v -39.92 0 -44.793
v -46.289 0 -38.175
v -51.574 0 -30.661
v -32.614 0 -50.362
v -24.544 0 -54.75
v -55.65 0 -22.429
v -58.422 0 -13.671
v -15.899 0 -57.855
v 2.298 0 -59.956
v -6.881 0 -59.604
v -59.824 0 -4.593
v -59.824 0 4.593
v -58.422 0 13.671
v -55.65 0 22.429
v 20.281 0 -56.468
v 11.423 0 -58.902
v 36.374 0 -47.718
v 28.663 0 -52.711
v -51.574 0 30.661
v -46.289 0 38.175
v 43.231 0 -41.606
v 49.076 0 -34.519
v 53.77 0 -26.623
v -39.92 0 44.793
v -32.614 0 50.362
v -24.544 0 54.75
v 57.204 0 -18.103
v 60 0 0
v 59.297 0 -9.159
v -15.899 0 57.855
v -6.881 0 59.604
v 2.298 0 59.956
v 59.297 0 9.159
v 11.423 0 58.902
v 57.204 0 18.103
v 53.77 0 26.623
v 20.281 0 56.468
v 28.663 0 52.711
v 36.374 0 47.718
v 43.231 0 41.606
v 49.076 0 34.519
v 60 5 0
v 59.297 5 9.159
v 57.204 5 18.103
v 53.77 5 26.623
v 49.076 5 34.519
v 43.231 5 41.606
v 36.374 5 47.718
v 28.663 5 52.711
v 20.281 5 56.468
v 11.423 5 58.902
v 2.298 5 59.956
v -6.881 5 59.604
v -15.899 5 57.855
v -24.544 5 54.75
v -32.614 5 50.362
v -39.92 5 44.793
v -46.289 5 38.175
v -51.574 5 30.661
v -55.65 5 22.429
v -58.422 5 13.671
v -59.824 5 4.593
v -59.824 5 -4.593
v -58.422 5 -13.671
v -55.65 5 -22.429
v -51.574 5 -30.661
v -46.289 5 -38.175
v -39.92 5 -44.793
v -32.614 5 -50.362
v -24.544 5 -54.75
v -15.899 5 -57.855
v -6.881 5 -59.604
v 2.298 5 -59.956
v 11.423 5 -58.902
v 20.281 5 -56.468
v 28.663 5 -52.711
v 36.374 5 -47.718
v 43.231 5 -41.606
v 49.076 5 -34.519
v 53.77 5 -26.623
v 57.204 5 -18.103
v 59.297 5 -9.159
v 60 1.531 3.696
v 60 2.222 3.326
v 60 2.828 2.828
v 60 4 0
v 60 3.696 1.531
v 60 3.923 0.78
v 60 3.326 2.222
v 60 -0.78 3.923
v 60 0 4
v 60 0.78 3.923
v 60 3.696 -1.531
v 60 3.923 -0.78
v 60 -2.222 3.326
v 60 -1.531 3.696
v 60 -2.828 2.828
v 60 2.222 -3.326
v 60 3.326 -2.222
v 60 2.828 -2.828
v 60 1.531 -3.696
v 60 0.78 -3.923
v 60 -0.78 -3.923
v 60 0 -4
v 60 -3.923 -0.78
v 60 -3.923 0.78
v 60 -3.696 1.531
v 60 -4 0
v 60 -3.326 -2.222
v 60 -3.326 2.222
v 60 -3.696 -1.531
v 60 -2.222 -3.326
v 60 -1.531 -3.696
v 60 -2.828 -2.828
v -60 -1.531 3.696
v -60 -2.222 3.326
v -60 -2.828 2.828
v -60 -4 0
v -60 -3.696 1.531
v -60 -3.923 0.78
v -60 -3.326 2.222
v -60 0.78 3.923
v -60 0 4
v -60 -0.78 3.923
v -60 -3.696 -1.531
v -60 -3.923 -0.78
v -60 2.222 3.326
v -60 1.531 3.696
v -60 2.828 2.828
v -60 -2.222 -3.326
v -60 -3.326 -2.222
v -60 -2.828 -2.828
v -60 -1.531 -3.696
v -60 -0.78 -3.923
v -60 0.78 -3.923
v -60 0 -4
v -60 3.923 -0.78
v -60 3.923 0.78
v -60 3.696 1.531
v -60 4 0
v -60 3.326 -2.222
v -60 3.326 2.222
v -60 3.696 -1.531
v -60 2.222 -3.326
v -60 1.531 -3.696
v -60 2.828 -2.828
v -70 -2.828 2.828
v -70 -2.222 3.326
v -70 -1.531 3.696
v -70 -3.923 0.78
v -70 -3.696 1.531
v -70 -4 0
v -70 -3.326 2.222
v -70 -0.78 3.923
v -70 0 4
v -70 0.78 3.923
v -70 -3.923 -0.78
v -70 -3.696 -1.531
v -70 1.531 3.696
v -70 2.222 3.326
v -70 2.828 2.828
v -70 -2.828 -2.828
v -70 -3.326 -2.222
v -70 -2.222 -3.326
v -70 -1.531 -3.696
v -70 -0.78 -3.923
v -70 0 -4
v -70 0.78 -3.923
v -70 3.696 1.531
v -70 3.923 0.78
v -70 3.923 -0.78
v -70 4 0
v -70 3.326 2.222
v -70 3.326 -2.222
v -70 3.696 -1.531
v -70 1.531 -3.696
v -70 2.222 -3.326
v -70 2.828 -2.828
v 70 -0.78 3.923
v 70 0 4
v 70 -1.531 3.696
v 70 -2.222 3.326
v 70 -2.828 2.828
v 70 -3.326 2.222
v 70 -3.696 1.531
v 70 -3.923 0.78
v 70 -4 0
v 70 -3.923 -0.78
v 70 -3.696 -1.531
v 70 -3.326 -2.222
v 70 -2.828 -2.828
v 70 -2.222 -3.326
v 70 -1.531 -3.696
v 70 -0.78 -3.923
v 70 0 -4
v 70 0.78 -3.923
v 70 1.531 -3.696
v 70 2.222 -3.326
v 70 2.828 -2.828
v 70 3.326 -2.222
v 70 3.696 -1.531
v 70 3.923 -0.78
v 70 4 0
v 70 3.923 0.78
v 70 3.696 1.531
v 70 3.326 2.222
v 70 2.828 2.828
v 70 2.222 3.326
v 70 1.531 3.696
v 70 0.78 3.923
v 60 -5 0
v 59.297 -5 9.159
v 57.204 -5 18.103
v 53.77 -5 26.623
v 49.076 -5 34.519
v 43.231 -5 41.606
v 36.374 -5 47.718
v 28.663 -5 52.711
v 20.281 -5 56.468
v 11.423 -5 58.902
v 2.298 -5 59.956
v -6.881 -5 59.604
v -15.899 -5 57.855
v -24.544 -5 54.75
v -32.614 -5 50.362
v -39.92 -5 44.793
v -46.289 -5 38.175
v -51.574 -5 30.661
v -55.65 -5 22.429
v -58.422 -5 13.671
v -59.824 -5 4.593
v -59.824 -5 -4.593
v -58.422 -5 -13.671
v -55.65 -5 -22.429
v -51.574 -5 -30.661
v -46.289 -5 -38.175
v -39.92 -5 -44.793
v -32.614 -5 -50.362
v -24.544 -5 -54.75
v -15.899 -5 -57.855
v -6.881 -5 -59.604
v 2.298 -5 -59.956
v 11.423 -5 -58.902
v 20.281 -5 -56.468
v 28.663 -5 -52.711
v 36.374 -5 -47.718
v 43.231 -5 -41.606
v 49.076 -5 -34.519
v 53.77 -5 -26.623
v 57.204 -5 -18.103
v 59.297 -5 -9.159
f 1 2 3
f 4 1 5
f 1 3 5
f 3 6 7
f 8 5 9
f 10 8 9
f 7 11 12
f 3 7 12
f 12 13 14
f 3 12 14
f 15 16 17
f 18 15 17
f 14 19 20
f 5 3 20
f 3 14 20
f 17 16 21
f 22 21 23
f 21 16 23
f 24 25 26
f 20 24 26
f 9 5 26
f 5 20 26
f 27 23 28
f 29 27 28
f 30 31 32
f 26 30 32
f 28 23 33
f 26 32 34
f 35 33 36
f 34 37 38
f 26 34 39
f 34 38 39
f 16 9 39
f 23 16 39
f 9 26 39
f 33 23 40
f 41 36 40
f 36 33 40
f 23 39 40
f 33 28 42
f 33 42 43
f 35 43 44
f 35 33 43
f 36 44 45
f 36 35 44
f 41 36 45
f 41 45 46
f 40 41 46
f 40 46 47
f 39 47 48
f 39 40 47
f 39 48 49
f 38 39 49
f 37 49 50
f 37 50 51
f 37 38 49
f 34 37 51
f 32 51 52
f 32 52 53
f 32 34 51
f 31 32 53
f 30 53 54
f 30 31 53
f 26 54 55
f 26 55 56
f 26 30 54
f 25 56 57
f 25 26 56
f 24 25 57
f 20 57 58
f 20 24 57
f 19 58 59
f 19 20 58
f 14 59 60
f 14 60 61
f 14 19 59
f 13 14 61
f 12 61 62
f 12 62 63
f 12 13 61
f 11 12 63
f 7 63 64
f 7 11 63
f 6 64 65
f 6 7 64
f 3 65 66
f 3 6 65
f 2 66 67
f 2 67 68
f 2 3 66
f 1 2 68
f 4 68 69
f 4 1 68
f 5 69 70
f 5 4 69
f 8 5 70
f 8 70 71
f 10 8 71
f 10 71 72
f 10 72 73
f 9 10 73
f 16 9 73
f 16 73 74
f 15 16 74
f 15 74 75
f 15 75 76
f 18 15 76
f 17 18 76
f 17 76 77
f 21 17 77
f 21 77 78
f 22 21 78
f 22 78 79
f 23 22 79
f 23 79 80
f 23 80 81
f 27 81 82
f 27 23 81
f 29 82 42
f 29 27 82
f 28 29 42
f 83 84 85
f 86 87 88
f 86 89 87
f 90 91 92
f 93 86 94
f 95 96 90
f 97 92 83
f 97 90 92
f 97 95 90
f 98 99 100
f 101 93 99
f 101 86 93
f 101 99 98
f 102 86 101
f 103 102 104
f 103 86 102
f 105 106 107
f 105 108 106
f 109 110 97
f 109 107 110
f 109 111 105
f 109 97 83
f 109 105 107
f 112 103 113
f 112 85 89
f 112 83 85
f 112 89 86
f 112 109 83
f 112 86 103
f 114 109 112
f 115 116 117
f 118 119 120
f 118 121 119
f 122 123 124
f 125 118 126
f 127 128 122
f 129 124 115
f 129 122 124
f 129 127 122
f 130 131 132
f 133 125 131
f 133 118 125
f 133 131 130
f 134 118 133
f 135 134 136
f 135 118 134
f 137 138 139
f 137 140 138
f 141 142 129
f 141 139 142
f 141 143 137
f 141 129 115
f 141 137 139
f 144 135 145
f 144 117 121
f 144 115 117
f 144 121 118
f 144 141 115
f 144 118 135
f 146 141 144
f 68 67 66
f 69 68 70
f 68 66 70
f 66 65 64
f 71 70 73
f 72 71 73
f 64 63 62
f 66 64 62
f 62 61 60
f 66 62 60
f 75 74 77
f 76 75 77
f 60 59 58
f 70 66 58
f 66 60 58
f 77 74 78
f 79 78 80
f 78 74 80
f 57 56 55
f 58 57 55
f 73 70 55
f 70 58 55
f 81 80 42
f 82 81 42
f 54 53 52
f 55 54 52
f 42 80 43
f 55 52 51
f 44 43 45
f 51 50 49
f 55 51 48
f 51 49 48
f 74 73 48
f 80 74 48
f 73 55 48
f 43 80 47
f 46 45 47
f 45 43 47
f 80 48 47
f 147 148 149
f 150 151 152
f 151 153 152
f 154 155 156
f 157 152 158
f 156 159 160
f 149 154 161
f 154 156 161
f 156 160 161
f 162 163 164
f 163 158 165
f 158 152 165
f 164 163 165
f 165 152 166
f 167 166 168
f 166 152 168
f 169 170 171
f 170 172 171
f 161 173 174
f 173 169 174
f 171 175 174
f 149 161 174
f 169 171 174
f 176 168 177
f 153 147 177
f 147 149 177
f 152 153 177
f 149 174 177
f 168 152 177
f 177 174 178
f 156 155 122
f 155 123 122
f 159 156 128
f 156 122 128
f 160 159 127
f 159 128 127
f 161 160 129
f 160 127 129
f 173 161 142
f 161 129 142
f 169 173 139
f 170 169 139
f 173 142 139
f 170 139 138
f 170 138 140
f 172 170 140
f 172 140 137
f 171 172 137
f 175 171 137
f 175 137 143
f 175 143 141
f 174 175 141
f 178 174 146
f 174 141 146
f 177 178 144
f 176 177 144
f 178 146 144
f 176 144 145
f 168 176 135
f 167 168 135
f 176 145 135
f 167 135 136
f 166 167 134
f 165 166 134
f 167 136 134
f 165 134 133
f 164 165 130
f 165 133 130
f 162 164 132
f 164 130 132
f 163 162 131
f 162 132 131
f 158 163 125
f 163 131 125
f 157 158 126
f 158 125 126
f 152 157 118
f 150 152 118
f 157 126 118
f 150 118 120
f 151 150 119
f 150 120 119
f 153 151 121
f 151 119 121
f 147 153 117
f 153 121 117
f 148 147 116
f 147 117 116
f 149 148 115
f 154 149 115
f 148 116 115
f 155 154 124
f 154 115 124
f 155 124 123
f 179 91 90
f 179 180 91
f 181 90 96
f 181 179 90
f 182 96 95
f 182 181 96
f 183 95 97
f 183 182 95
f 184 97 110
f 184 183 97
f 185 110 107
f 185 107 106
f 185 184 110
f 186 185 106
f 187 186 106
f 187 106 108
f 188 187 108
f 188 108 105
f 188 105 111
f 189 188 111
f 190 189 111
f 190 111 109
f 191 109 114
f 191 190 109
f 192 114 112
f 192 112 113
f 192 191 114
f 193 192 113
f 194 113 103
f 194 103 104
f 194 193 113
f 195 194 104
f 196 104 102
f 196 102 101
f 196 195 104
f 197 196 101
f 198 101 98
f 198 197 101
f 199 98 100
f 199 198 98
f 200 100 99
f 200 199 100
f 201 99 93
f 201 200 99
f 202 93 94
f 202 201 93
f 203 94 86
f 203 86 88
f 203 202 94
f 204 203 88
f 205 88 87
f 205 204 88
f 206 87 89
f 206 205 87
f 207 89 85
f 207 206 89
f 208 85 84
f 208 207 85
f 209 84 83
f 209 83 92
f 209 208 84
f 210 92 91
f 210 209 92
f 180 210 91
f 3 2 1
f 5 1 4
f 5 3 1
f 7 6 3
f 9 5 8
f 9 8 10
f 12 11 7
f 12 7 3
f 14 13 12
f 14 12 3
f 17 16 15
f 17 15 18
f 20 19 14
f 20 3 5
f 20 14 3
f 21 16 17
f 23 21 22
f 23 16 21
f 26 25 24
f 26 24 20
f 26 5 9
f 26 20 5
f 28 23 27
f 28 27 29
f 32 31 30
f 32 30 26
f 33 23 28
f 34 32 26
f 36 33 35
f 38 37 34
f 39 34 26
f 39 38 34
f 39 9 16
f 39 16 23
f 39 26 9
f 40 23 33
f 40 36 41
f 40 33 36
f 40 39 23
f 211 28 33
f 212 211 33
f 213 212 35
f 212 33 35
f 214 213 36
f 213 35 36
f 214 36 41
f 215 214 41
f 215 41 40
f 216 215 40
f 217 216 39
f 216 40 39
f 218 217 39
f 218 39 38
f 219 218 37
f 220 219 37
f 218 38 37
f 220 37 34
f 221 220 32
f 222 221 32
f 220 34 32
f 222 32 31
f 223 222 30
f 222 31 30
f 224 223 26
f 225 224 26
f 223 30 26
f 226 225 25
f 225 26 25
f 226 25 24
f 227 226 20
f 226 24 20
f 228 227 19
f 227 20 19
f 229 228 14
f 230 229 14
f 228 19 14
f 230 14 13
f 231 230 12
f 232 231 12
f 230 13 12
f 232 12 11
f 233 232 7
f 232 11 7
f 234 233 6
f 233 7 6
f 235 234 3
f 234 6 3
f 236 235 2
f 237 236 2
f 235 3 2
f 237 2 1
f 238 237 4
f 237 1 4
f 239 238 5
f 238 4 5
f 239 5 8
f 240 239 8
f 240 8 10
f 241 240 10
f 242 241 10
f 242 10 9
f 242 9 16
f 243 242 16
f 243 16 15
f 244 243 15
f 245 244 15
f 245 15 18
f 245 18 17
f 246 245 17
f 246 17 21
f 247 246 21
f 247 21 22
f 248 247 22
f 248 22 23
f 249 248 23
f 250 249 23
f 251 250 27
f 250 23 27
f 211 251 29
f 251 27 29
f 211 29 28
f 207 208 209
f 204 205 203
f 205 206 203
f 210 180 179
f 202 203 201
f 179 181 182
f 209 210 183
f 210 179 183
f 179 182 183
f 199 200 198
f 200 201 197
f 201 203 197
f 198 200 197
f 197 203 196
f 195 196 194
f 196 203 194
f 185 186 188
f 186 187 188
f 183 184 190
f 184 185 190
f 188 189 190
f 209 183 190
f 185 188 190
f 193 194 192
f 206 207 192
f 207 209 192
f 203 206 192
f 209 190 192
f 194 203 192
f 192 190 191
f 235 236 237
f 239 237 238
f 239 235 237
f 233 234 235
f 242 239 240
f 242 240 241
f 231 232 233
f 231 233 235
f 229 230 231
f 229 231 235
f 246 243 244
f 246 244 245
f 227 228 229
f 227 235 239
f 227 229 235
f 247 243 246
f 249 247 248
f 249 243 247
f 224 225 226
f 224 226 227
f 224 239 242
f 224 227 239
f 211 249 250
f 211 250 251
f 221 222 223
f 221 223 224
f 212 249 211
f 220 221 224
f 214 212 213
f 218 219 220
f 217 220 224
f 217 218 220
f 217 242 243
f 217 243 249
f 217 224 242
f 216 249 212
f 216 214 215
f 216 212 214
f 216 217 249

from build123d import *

# Parameters (mm, degrees)
F1_W     = 10
F1_H     = 4
F2_W     = 10
F2_H     = 4
F0_R     = 60
F5_DEPTH = 5


with BuildPart() as f3:
    # F1 (on Front) → F3 (revolve)
    with BuildSketch(Plane.XZ):
        with Locations((-65, 2)):
            Rectangle(F1_W, F1_H)
    revolve(axis=Axis((-65, 0, 0), (-1, 0, 0)))


with BuildPart() as f4:
    # F2 (on Front) → F4 (revolve)
    with BuildSketch(Plane.XZ):
        with Locations((65, 2)):
            Rectangle(F2_W, F2_H)
    revolve(axis=Axis((65, 0, 0), (1, 0, 0)))


with BuildPart() as f5:
    # F0 (on Front) → F5 (new body)
    with BuildSketch(Plane.XZ):
        Circle(F0_R)
    extrude(amount=F5_DEPTH)


with BuildPart() as f6_1:
    # F6: instance of F5
    add(f5.part.mirror(Plane.XZ))


solid = Compound([f3.part, f4.part, f5.part, f6_1.part])
